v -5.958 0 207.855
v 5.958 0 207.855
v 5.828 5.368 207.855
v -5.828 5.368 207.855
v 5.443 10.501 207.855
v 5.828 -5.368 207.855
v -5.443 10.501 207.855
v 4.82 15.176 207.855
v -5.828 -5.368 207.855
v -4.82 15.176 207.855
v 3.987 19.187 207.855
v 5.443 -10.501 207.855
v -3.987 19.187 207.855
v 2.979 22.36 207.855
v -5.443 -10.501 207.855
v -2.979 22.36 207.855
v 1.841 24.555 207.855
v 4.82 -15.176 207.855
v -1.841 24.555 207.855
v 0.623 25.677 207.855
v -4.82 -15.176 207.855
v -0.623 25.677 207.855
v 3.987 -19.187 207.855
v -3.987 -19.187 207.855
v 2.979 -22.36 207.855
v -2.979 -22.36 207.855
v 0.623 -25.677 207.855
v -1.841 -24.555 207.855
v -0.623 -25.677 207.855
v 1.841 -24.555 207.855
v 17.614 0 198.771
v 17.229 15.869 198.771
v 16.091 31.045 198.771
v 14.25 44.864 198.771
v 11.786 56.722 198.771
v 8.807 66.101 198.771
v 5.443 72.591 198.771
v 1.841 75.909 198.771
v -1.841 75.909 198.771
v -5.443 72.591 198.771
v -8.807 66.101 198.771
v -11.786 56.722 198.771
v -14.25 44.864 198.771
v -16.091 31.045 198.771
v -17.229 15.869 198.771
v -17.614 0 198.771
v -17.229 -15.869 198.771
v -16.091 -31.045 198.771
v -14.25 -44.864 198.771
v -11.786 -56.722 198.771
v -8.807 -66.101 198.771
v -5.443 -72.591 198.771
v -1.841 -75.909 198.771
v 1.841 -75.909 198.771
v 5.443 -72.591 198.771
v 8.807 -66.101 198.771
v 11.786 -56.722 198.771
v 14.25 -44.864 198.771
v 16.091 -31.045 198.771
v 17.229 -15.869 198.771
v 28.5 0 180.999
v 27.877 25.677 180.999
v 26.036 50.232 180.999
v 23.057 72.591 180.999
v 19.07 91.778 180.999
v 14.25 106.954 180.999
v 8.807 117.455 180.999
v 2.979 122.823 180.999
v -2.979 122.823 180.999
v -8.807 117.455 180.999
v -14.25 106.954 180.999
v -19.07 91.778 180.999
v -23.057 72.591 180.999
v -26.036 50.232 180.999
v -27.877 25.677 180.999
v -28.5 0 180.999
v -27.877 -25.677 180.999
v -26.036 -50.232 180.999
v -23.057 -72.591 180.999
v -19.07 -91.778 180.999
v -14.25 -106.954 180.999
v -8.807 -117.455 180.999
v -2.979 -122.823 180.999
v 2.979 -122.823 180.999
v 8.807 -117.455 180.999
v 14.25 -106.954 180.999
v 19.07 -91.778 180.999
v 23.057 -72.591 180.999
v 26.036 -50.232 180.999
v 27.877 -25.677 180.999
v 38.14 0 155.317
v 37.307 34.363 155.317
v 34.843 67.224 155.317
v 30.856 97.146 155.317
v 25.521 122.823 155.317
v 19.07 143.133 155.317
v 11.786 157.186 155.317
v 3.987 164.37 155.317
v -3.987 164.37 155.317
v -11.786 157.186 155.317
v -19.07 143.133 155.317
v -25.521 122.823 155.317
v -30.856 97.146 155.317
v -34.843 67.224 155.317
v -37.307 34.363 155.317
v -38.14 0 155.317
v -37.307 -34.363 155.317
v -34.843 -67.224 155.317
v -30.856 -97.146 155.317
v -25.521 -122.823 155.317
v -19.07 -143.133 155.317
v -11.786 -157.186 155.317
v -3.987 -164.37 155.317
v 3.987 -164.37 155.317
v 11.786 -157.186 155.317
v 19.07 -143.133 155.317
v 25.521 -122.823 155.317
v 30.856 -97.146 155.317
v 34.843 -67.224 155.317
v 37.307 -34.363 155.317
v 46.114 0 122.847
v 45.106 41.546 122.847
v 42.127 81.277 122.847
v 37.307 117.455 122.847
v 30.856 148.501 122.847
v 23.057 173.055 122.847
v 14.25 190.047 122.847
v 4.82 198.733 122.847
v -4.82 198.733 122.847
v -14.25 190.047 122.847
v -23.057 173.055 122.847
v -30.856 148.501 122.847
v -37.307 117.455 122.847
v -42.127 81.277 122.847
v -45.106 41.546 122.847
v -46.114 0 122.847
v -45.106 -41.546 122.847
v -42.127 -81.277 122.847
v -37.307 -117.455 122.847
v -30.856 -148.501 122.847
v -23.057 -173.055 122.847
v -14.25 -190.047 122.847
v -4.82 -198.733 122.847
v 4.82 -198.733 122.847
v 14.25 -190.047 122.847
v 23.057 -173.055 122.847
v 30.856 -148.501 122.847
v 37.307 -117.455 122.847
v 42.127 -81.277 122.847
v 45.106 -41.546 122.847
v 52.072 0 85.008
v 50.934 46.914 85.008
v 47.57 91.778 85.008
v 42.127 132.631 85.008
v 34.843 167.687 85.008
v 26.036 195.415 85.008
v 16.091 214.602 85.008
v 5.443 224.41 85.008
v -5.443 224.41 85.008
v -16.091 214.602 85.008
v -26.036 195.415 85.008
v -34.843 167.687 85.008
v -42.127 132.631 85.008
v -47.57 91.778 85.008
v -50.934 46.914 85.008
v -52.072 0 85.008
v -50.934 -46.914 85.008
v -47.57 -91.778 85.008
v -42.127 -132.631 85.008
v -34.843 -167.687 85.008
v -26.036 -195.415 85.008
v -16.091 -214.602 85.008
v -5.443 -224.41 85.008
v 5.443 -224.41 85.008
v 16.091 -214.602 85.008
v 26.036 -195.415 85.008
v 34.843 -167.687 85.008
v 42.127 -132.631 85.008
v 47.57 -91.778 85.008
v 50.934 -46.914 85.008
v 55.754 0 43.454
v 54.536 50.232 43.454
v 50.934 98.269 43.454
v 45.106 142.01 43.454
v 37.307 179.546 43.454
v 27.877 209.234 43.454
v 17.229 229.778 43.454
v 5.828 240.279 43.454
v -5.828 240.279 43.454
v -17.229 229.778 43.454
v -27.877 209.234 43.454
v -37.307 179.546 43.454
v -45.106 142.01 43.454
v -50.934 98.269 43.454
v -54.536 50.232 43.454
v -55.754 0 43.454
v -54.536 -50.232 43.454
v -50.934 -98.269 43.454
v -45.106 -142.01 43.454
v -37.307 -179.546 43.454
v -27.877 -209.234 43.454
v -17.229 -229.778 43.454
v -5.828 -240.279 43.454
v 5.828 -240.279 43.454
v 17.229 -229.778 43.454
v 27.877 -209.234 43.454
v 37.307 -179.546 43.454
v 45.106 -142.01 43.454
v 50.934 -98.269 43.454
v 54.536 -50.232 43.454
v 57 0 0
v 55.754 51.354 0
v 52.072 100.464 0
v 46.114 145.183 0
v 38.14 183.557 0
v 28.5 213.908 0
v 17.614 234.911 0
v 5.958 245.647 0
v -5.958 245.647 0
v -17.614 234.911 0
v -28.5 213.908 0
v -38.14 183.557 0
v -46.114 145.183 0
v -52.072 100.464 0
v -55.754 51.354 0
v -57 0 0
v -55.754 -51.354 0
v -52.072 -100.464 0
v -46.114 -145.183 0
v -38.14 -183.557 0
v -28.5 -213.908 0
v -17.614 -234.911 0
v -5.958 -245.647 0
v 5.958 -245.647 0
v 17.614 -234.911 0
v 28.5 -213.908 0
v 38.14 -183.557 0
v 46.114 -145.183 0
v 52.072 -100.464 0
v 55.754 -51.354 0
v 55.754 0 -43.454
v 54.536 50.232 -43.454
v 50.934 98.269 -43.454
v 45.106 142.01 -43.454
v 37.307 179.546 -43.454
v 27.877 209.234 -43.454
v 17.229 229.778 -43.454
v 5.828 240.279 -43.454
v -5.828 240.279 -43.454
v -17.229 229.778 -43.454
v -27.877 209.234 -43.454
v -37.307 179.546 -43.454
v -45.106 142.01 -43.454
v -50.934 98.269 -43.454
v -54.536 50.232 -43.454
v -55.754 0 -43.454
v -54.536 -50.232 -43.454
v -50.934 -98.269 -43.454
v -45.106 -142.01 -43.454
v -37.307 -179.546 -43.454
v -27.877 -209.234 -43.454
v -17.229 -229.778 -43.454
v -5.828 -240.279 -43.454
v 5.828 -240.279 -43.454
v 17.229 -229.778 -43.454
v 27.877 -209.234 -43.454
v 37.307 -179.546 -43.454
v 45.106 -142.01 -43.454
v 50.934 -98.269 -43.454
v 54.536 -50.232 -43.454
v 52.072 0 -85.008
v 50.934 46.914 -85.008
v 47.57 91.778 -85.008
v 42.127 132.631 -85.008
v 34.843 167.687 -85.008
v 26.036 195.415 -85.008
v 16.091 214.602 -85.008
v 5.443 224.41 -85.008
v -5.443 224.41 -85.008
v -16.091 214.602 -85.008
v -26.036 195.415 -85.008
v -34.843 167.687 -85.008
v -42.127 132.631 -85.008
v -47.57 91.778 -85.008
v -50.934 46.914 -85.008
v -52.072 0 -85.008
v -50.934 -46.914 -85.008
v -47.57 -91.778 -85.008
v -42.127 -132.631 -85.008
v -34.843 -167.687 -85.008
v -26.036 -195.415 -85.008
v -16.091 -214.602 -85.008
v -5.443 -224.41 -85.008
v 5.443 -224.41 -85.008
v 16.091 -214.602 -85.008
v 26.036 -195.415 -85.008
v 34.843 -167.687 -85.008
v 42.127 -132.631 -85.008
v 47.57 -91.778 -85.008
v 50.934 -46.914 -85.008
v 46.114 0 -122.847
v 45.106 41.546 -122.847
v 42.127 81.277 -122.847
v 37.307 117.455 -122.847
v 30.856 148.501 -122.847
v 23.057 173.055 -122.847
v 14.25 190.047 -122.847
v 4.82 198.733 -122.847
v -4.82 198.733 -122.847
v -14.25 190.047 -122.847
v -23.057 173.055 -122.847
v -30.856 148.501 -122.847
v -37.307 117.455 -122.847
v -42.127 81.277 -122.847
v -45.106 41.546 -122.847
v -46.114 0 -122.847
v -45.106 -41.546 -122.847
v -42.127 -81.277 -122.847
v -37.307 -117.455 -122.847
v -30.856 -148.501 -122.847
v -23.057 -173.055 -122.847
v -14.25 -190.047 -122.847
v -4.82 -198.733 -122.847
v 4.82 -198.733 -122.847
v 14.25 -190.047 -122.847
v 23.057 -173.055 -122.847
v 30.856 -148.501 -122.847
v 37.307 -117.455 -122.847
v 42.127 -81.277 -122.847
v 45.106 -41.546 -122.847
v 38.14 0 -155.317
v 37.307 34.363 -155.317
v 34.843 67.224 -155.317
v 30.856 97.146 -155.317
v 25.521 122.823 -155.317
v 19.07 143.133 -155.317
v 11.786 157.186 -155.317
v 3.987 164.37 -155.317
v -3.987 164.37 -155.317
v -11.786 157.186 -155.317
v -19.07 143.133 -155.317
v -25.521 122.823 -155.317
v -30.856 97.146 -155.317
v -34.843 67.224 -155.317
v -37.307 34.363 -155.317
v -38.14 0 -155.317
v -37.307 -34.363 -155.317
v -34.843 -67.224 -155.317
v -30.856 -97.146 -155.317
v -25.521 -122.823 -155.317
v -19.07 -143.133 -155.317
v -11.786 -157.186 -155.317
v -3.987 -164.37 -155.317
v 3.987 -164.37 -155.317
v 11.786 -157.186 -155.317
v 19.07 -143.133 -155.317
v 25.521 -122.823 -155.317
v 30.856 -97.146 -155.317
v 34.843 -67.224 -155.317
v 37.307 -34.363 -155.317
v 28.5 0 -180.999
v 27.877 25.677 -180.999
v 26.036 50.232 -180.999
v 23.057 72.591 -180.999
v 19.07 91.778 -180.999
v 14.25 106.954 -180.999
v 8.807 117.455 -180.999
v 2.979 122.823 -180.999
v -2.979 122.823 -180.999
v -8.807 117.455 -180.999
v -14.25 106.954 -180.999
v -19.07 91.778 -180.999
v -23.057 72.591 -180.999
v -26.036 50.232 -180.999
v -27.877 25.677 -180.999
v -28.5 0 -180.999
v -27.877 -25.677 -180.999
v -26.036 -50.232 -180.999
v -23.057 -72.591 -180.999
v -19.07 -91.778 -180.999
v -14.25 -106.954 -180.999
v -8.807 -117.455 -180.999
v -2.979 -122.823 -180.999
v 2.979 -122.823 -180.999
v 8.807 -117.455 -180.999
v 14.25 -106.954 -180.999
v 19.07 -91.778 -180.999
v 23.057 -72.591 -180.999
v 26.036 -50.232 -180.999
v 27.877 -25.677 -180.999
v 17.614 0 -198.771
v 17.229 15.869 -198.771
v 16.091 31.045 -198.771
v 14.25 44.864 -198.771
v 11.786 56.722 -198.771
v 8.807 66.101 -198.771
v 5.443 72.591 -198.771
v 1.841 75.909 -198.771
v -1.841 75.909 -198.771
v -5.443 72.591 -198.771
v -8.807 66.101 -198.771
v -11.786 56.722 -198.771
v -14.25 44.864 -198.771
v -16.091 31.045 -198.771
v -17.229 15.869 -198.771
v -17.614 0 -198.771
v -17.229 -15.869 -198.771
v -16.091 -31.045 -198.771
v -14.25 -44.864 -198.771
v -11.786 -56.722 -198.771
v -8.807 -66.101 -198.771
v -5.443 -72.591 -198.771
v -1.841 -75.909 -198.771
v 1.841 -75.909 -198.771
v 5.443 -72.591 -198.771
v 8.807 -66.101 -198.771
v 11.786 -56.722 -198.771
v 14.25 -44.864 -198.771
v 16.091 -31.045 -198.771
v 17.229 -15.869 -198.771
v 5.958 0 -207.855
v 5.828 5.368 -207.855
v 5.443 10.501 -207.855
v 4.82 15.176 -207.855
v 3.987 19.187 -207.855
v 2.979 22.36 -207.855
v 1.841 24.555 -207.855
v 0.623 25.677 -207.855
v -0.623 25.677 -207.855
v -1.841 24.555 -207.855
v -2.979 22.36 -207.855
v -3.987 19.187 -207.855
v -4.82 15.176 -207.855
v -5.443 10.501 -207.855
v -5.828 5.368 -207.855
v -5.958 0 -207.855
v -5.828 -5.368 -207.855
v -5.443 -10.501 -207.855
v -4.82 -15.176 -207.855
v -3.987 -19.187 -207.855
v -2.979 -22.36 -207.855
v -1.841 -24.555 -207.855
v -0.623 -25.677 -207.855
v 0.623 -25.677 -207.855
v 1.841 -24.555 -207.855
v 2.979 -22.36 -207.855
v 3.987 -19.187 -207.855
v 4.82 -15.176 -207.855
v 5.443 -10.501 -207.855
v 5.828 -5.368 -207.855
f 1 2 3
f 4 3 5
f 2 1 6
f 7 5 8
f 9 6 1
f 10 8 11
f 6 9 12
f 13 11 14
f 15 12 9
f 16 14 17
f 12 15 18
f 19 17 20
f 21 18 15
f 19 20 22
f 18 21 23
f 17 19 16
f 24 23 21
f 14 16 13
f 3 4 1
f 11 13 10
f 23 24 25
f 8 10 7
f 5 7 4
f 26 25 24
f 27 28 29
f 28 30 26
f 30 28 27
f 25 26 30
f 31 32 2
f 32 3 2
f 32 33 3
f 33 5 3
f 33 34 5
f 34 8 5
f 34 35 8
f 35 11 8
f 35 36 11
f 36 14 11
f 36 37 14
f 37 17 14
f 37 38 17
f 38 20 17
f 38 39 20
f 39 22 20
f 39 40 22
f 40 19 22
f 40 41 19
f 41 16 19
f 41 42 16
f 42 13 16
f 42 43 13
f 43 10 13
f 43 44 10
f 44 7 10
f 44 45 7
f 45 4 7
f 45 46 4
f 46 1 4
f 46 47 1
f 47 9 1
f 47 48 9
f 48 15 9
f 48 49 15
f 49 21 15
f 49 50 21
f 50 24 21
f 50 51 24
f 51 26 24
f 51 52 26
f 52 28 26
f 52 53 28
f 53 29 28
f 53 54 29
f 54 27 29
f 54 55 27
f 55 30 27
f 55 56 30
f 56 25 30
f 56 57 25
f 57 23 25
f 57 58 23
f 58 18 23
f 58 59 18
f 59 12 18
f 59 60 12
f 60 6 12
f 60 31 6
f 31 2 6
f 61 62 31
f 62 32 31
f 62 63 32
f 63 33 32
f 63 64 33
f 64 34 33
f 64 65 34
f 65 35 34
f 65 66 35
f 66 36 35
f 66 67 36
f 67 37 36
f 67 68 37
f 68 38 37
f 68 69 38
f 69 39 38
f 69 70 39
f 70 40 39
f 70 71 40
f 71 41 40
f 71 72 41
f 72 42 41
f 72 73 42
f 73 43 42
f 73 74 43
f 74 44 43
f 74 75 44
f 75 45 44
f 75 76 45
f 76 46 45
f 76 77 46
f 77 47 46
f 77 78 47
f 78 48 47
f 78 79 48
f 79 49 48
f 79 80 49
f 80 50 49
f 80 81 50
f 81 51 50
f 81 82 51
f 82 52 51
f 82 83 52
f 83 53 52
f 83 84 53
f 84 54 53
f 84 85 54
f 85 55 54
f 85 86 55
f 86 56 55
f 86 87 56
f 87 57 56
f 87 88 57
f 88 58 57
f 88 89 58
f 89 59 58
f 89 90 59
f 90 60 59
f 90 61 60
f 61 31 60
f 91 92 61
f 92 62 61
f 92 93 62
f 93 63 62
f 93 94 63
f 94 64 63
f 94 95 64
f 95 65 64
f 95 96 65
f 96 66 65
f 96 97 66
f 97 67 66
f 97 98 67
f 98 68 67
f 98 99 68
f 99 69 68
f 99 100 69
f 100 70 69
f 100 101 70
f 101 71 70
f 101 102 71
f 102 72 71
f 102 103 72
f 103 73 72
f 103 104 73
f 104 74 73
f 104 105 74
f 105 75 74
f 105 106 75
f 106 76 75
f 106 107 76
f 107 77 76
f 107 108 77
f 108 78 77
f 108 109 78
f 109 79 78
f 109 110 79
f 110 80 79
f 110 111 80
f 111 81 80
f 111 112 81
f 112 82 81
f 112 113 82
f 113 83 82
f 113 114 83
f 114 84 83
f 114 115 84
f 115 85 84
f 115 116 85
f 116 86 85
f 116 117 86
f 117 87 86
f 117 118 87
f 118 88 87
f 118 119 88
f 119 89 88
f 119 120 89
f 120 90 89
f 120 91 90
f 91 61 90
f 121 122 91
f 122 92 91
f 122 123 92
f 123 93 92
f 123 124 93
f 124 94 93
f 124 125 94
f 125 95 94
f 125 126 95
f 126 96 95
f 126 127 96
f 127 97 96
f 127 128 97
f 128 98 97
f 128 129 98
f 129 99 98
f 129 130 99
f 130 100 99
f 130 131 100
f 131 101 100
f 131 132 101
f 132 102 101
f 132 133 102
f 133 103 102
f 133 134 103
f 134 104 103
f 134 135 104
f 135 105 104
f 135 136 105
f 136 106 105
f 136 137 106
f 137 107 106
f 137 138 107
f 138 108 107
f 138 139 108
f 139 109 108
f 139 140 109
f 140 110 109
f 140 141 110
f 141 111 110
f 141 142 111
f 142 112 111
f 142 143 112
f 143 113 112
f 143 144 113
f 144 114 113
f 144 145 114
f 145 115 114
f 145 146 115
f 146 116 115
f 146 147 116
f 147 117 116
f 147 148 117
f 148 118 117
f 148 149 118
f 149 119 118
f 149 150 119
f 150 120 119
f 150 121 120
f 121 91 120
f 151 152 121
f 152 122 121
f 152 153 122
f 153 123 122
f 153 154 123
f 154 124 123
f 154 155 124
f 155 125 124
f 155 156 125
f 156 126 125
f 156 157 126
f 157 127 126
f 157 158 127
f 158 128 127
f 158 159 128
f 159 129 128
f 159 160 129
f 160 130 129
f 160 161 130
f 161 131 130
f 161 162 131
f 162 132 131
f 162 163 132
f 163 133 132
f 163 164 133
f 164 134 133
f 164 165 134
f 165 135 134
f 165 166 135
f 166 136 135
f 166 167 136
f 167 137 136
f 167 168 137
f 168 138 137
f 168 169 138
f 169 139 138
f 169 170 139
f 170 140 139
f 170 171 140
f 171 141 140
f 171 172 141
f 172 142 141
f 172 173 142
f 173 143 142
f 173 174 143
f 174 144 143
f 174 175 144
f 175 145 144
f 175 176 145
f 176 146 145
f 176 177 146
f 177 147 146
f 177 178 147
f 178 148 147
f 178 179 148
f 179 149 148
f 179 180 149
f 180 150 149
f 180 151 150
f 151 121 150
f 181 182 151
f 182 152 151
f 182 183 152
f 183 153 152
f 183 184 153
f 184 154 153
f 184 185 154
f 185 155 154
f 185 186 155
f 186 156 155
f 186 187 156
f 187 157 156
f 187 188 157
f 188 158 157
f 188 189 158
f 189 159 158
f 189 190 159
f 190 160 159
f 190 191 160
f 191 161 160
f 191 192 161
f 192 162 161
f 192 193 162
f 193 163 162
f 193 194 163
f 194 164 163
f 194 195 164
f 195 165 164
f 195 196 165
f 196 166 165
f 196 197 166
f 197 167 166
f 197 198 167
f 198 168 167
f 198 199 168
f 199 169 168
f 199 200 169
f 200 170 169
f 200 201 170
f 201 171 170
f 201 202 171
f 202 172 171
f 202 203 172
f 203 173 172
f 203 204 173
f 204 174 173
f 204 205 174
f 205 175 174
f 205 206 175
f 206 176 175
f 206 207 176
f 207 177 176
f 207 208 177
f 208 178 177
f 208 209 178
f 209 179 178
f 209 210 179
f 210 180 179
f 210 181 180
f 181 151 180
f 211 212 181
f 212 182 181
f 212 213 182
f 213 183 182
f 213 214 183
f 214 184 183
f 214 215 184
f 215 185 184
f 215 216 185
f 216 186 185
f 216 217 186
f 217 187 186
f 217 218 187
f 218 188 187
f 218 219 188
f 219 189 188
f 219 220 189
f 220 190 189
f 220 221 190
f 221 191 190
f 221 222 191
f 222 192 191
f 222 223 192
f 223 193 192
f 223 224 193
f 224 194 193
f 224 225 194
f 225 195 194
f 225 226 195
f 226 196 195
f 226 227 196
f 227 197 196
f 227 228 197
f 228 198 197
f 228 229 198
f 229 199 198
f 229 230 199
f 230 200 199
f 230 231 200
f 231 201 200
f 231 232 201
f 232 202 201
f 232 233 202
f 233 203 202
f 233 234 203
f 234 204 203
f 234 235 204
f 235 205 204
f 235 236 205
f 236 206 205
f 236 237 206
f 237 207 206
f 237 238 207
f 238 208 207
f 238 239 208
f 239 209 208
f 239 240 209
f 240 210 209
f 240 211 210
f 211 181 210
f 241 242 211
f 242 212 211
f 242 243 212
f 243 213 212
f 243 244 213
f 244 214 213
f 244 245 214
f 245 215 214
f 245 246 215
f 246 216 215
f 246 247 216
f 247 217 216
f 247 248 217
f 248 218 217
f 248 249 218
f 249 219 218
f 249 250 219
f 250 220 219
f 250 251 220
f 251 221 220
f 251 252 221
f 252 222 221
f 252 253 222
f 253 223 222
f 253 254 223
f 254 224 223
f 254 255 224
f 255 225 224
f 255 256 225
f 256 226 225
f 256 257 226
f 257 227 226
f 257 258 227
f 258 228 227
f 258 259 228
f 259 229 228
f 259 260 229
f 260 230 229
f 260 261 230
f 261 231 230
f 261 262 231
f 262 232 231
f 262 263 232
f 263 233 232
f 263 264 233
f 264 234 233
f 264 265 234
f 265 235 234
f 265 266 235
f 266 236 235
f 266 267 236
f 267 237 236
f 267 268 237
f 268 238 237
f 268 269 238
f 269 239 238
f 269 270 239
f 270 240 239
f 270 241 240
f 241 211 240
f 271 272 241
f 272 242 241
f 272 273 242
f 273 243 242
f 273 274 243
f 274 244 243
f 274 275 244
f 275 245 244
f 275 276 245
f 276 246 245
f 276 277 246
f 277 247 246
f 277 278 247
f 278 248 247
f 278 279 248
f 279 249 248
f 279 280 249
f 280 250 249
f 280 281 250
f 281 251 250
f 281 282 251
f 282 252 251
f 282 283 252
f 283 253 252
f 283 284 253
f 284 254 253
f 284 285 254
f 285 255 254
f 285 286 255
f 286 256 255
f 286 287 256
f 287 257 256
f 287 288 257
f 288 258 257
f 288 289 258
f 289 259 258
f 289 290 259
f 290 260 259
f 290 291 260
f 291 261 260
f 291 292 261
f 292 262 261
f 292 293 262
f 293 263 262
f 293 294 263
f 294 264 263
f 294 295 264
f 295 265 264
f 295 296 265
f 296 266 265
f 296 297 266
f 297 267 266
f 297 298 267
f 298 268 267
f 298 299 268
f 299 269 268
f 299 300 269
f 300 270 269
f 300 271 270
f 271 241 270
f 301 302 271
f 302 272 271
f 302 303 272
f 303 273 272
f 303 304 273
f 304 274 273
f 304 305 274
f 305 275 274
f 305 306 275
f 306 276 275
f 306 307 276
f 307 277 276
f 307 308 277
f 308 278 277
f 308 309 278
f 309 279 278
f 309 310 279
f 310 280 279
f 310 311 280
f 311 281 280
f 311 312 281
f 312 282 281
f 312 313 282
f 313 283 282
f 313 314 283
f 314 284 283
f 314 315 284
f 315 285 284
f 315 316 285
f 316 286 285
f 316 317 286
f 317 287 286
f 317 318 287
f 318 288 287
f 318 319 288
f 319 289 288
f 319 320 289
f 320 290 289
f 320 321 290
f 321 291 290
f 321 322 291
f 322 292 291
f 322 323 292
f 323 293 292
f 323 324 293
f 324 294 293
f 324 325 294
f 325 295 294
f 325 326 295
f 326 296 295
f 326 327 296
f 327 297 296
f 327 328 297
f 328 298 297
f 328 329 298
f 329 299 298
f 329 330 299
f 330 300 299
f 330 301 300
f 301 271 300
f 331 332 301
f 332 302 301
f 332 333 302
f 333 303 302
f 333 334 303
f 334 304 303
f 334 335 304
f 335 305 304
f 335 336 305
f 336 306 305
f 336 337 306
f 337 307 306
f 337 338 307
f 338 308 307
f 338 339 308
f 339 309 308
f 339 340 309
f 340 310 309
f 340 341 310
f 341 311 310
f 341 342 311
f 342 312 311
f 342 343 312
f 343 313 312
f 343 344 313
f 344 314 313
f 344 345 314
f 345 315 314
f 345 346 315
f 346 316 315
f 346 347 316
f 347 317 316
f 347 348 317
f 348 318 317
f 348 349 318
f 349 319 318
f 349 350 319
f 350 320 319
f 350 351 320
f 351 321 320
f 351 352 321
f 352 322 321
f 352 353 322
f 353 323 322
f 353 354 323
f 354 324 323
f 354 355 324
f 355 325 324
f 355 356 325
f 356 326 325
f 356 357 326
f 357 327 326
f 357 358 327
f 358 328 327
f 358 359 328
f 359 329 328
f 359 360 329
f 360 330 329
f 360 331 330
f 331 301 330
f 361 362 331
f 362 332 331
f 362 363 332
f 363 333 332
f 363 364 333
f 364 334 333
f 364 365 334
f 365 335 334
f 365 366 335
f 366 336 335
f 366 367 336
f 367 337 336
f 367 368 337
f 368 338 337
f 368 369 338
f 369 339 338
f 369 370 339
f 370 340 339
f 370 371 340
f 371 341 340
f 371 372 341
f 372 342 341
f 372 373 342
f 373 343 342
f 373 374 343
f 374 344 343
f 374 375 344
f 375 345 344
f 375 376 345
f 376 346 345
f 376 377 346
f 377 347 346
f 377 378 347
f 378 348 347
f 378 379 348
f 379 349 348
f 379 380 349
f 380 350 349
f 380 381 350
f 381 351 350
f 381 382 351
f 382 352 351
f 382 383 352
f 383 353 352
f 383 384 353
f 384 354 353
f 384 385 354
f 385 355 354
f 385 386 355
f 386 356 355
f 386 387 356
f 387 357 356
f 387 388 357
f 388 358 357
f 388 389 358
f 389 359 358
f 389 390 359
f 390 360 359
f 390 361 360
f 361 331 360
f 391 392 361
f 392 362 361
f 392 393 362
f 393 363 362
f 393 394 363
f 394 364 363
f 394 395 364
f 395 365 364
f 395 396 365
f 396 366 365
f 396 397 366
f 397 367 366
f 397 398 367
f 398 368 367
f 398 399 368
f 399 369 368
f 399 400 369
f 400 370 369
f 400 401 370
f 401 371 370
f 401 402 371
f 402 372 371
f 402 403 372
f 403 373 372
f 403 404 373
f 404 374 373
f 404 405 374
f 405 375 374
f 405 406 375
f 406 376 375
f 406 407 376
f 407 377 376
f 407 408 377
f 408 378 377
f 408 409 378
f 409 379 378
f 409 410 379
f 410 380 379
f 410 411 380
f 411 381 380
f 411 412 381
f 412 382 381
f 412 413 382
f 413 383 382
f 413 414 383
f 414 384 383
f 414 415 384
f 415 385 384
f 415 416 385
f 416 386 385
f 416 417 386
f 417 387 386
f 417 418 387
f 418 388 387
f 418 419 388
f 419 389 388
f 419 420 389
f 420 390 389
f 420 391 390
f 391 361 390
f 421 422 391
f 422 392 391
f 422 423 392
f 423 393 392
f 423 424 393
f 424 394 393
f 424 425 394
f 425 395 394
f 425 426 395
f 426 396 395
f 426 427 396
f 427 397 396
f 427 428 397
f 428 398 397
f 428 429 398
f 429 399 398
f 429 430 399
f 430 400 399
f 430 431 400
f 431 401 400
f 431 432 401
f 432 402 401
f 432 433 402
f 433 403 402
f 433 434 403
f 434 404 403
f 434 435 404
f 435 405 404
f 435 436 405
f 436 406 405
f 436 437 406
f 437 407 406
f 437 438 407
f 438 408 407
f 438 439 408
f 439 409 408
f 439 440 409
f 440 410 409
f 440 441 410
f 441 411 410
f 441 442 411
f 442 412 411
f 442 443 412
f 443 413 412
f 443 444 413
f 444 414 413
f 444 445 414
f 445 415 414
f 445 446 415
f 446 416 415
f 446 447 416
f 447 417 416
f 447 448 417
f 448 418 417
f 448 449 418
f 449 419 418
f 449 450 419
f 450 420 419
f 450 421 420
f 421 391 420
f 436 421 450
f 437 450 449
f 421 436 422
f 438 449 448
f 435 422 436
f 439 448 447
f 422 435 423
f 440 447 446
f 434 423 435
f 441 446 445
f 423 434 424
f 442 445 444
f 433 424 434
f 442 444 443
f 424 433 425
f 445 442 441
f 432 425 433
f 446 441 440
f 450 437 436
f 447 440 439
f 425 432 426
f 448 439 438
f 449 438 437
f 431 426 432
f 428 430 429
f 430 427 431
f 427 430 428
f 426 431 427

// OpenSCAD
// Generated by SolidPython 1.0.1 on 2020-07-29 00:46:45


scale(v = [3, 13, 11]) {
	sphere(r = 19);
}
/***********************************************
*********      SolidPython code:      **********
************************************************
 
# import packages: SolidPython
from solid import *
from solid.utils import *
from itertools import chain, combinations, permutations


class Resize:

    def __init__(self, scad_file):
        self.scad_file = scad_file
        #self.scad_file = import_scad(scad_file)
        # cone/cylinder param:
        self.r1 = 0
        self.r2 = 0
        self.h = 0
        # rectangular prism param:
        self.w = 0
        self.l = 0
        # ellipse param:
        self.r = 0

    # import OpenScad code (file name corresponds to shape)


    # classify shape + parameters
    def assign(self, param1, param2, param3):
        if self.scad_file == 'cone.scad':
            self.r1 = param1
            self.r2 = param2
            self.h = param3
        elif self.scad_file == 'cylinder.scad':
            self.r1 = param1
            self.r2 = param2
            self.h = param3
        elif self.scad_file == 'rectangularPrism.scad':
            self.h = param1
            self.l = param2
            self.w = param3
        else:
            self.r = param1
            self.h = param2

    # resize parameters
    def iterate(self):
        x = range(3, 20, 2)
        i = 1
        if self.scad_file == 'cone.scad':
            tempList = list(permutations(x, 2))
            for temp in tempList:
                param1 = temp[0]
                param2 = temp[1]
                filepath = 'produced_scad_files/' + 'cone' + str(param1) + '_' + str(param2) + '_' + '.scad'
                scad_render_to_file(cylinder(h=param1, r1=param2, r2=0), filepath)

        elif self.scad_file == 'cylinder.scad':
            tempList = list(permutations(x, 3))
            for temp in tempList:
                param1 = temp[0]
                param2 = temp[1]
                filepath = 'produced_scad_files/' + 'cylinder' + str(param1) + '_' + str(param2) + '_' + '.scad'
                scad_render_to_file(cylinder(h=param1, r1=param2, r2=param2), filepath)

        elif self.scad_file == 'rectangularPrism.scad':
            tempList = list(permutations(x, 3))
            for temp in tempList:
                param1 = temp[0]
                param2 = temp[1]
                param3 = temp[2]
                filepath = 'produced_scad_files/' + 'rectangularPrism' + str(param1) + '_' + str(param2) + '_' + str(
                    param3) + '.scad'
                scad_render_to_file(cube(size=(param1, param2, param3)), filepath)

        elif self.scad_file == 'ellipse.scad':
            tempList = list(permutations(x, 4))
            for temp in tempList:
                param1 = temp[0]
                param2 = temp[1]
                param3 = temp[2]
                param4 = temp[3]
                filepath = 'produced_scad_files/' + 'ellipse' + str(param1) + '_' + str(param2) + '_' + str(param3) + '_' + str(param4) + '.scad'
                scad_render_to_file(scale([param1, param2, param3])(sphere(r=param4)), filepath)

    def render_to_scadfile(self):
        scad_render_to_file(scad, 'example.scad') 
 
************************************************/
